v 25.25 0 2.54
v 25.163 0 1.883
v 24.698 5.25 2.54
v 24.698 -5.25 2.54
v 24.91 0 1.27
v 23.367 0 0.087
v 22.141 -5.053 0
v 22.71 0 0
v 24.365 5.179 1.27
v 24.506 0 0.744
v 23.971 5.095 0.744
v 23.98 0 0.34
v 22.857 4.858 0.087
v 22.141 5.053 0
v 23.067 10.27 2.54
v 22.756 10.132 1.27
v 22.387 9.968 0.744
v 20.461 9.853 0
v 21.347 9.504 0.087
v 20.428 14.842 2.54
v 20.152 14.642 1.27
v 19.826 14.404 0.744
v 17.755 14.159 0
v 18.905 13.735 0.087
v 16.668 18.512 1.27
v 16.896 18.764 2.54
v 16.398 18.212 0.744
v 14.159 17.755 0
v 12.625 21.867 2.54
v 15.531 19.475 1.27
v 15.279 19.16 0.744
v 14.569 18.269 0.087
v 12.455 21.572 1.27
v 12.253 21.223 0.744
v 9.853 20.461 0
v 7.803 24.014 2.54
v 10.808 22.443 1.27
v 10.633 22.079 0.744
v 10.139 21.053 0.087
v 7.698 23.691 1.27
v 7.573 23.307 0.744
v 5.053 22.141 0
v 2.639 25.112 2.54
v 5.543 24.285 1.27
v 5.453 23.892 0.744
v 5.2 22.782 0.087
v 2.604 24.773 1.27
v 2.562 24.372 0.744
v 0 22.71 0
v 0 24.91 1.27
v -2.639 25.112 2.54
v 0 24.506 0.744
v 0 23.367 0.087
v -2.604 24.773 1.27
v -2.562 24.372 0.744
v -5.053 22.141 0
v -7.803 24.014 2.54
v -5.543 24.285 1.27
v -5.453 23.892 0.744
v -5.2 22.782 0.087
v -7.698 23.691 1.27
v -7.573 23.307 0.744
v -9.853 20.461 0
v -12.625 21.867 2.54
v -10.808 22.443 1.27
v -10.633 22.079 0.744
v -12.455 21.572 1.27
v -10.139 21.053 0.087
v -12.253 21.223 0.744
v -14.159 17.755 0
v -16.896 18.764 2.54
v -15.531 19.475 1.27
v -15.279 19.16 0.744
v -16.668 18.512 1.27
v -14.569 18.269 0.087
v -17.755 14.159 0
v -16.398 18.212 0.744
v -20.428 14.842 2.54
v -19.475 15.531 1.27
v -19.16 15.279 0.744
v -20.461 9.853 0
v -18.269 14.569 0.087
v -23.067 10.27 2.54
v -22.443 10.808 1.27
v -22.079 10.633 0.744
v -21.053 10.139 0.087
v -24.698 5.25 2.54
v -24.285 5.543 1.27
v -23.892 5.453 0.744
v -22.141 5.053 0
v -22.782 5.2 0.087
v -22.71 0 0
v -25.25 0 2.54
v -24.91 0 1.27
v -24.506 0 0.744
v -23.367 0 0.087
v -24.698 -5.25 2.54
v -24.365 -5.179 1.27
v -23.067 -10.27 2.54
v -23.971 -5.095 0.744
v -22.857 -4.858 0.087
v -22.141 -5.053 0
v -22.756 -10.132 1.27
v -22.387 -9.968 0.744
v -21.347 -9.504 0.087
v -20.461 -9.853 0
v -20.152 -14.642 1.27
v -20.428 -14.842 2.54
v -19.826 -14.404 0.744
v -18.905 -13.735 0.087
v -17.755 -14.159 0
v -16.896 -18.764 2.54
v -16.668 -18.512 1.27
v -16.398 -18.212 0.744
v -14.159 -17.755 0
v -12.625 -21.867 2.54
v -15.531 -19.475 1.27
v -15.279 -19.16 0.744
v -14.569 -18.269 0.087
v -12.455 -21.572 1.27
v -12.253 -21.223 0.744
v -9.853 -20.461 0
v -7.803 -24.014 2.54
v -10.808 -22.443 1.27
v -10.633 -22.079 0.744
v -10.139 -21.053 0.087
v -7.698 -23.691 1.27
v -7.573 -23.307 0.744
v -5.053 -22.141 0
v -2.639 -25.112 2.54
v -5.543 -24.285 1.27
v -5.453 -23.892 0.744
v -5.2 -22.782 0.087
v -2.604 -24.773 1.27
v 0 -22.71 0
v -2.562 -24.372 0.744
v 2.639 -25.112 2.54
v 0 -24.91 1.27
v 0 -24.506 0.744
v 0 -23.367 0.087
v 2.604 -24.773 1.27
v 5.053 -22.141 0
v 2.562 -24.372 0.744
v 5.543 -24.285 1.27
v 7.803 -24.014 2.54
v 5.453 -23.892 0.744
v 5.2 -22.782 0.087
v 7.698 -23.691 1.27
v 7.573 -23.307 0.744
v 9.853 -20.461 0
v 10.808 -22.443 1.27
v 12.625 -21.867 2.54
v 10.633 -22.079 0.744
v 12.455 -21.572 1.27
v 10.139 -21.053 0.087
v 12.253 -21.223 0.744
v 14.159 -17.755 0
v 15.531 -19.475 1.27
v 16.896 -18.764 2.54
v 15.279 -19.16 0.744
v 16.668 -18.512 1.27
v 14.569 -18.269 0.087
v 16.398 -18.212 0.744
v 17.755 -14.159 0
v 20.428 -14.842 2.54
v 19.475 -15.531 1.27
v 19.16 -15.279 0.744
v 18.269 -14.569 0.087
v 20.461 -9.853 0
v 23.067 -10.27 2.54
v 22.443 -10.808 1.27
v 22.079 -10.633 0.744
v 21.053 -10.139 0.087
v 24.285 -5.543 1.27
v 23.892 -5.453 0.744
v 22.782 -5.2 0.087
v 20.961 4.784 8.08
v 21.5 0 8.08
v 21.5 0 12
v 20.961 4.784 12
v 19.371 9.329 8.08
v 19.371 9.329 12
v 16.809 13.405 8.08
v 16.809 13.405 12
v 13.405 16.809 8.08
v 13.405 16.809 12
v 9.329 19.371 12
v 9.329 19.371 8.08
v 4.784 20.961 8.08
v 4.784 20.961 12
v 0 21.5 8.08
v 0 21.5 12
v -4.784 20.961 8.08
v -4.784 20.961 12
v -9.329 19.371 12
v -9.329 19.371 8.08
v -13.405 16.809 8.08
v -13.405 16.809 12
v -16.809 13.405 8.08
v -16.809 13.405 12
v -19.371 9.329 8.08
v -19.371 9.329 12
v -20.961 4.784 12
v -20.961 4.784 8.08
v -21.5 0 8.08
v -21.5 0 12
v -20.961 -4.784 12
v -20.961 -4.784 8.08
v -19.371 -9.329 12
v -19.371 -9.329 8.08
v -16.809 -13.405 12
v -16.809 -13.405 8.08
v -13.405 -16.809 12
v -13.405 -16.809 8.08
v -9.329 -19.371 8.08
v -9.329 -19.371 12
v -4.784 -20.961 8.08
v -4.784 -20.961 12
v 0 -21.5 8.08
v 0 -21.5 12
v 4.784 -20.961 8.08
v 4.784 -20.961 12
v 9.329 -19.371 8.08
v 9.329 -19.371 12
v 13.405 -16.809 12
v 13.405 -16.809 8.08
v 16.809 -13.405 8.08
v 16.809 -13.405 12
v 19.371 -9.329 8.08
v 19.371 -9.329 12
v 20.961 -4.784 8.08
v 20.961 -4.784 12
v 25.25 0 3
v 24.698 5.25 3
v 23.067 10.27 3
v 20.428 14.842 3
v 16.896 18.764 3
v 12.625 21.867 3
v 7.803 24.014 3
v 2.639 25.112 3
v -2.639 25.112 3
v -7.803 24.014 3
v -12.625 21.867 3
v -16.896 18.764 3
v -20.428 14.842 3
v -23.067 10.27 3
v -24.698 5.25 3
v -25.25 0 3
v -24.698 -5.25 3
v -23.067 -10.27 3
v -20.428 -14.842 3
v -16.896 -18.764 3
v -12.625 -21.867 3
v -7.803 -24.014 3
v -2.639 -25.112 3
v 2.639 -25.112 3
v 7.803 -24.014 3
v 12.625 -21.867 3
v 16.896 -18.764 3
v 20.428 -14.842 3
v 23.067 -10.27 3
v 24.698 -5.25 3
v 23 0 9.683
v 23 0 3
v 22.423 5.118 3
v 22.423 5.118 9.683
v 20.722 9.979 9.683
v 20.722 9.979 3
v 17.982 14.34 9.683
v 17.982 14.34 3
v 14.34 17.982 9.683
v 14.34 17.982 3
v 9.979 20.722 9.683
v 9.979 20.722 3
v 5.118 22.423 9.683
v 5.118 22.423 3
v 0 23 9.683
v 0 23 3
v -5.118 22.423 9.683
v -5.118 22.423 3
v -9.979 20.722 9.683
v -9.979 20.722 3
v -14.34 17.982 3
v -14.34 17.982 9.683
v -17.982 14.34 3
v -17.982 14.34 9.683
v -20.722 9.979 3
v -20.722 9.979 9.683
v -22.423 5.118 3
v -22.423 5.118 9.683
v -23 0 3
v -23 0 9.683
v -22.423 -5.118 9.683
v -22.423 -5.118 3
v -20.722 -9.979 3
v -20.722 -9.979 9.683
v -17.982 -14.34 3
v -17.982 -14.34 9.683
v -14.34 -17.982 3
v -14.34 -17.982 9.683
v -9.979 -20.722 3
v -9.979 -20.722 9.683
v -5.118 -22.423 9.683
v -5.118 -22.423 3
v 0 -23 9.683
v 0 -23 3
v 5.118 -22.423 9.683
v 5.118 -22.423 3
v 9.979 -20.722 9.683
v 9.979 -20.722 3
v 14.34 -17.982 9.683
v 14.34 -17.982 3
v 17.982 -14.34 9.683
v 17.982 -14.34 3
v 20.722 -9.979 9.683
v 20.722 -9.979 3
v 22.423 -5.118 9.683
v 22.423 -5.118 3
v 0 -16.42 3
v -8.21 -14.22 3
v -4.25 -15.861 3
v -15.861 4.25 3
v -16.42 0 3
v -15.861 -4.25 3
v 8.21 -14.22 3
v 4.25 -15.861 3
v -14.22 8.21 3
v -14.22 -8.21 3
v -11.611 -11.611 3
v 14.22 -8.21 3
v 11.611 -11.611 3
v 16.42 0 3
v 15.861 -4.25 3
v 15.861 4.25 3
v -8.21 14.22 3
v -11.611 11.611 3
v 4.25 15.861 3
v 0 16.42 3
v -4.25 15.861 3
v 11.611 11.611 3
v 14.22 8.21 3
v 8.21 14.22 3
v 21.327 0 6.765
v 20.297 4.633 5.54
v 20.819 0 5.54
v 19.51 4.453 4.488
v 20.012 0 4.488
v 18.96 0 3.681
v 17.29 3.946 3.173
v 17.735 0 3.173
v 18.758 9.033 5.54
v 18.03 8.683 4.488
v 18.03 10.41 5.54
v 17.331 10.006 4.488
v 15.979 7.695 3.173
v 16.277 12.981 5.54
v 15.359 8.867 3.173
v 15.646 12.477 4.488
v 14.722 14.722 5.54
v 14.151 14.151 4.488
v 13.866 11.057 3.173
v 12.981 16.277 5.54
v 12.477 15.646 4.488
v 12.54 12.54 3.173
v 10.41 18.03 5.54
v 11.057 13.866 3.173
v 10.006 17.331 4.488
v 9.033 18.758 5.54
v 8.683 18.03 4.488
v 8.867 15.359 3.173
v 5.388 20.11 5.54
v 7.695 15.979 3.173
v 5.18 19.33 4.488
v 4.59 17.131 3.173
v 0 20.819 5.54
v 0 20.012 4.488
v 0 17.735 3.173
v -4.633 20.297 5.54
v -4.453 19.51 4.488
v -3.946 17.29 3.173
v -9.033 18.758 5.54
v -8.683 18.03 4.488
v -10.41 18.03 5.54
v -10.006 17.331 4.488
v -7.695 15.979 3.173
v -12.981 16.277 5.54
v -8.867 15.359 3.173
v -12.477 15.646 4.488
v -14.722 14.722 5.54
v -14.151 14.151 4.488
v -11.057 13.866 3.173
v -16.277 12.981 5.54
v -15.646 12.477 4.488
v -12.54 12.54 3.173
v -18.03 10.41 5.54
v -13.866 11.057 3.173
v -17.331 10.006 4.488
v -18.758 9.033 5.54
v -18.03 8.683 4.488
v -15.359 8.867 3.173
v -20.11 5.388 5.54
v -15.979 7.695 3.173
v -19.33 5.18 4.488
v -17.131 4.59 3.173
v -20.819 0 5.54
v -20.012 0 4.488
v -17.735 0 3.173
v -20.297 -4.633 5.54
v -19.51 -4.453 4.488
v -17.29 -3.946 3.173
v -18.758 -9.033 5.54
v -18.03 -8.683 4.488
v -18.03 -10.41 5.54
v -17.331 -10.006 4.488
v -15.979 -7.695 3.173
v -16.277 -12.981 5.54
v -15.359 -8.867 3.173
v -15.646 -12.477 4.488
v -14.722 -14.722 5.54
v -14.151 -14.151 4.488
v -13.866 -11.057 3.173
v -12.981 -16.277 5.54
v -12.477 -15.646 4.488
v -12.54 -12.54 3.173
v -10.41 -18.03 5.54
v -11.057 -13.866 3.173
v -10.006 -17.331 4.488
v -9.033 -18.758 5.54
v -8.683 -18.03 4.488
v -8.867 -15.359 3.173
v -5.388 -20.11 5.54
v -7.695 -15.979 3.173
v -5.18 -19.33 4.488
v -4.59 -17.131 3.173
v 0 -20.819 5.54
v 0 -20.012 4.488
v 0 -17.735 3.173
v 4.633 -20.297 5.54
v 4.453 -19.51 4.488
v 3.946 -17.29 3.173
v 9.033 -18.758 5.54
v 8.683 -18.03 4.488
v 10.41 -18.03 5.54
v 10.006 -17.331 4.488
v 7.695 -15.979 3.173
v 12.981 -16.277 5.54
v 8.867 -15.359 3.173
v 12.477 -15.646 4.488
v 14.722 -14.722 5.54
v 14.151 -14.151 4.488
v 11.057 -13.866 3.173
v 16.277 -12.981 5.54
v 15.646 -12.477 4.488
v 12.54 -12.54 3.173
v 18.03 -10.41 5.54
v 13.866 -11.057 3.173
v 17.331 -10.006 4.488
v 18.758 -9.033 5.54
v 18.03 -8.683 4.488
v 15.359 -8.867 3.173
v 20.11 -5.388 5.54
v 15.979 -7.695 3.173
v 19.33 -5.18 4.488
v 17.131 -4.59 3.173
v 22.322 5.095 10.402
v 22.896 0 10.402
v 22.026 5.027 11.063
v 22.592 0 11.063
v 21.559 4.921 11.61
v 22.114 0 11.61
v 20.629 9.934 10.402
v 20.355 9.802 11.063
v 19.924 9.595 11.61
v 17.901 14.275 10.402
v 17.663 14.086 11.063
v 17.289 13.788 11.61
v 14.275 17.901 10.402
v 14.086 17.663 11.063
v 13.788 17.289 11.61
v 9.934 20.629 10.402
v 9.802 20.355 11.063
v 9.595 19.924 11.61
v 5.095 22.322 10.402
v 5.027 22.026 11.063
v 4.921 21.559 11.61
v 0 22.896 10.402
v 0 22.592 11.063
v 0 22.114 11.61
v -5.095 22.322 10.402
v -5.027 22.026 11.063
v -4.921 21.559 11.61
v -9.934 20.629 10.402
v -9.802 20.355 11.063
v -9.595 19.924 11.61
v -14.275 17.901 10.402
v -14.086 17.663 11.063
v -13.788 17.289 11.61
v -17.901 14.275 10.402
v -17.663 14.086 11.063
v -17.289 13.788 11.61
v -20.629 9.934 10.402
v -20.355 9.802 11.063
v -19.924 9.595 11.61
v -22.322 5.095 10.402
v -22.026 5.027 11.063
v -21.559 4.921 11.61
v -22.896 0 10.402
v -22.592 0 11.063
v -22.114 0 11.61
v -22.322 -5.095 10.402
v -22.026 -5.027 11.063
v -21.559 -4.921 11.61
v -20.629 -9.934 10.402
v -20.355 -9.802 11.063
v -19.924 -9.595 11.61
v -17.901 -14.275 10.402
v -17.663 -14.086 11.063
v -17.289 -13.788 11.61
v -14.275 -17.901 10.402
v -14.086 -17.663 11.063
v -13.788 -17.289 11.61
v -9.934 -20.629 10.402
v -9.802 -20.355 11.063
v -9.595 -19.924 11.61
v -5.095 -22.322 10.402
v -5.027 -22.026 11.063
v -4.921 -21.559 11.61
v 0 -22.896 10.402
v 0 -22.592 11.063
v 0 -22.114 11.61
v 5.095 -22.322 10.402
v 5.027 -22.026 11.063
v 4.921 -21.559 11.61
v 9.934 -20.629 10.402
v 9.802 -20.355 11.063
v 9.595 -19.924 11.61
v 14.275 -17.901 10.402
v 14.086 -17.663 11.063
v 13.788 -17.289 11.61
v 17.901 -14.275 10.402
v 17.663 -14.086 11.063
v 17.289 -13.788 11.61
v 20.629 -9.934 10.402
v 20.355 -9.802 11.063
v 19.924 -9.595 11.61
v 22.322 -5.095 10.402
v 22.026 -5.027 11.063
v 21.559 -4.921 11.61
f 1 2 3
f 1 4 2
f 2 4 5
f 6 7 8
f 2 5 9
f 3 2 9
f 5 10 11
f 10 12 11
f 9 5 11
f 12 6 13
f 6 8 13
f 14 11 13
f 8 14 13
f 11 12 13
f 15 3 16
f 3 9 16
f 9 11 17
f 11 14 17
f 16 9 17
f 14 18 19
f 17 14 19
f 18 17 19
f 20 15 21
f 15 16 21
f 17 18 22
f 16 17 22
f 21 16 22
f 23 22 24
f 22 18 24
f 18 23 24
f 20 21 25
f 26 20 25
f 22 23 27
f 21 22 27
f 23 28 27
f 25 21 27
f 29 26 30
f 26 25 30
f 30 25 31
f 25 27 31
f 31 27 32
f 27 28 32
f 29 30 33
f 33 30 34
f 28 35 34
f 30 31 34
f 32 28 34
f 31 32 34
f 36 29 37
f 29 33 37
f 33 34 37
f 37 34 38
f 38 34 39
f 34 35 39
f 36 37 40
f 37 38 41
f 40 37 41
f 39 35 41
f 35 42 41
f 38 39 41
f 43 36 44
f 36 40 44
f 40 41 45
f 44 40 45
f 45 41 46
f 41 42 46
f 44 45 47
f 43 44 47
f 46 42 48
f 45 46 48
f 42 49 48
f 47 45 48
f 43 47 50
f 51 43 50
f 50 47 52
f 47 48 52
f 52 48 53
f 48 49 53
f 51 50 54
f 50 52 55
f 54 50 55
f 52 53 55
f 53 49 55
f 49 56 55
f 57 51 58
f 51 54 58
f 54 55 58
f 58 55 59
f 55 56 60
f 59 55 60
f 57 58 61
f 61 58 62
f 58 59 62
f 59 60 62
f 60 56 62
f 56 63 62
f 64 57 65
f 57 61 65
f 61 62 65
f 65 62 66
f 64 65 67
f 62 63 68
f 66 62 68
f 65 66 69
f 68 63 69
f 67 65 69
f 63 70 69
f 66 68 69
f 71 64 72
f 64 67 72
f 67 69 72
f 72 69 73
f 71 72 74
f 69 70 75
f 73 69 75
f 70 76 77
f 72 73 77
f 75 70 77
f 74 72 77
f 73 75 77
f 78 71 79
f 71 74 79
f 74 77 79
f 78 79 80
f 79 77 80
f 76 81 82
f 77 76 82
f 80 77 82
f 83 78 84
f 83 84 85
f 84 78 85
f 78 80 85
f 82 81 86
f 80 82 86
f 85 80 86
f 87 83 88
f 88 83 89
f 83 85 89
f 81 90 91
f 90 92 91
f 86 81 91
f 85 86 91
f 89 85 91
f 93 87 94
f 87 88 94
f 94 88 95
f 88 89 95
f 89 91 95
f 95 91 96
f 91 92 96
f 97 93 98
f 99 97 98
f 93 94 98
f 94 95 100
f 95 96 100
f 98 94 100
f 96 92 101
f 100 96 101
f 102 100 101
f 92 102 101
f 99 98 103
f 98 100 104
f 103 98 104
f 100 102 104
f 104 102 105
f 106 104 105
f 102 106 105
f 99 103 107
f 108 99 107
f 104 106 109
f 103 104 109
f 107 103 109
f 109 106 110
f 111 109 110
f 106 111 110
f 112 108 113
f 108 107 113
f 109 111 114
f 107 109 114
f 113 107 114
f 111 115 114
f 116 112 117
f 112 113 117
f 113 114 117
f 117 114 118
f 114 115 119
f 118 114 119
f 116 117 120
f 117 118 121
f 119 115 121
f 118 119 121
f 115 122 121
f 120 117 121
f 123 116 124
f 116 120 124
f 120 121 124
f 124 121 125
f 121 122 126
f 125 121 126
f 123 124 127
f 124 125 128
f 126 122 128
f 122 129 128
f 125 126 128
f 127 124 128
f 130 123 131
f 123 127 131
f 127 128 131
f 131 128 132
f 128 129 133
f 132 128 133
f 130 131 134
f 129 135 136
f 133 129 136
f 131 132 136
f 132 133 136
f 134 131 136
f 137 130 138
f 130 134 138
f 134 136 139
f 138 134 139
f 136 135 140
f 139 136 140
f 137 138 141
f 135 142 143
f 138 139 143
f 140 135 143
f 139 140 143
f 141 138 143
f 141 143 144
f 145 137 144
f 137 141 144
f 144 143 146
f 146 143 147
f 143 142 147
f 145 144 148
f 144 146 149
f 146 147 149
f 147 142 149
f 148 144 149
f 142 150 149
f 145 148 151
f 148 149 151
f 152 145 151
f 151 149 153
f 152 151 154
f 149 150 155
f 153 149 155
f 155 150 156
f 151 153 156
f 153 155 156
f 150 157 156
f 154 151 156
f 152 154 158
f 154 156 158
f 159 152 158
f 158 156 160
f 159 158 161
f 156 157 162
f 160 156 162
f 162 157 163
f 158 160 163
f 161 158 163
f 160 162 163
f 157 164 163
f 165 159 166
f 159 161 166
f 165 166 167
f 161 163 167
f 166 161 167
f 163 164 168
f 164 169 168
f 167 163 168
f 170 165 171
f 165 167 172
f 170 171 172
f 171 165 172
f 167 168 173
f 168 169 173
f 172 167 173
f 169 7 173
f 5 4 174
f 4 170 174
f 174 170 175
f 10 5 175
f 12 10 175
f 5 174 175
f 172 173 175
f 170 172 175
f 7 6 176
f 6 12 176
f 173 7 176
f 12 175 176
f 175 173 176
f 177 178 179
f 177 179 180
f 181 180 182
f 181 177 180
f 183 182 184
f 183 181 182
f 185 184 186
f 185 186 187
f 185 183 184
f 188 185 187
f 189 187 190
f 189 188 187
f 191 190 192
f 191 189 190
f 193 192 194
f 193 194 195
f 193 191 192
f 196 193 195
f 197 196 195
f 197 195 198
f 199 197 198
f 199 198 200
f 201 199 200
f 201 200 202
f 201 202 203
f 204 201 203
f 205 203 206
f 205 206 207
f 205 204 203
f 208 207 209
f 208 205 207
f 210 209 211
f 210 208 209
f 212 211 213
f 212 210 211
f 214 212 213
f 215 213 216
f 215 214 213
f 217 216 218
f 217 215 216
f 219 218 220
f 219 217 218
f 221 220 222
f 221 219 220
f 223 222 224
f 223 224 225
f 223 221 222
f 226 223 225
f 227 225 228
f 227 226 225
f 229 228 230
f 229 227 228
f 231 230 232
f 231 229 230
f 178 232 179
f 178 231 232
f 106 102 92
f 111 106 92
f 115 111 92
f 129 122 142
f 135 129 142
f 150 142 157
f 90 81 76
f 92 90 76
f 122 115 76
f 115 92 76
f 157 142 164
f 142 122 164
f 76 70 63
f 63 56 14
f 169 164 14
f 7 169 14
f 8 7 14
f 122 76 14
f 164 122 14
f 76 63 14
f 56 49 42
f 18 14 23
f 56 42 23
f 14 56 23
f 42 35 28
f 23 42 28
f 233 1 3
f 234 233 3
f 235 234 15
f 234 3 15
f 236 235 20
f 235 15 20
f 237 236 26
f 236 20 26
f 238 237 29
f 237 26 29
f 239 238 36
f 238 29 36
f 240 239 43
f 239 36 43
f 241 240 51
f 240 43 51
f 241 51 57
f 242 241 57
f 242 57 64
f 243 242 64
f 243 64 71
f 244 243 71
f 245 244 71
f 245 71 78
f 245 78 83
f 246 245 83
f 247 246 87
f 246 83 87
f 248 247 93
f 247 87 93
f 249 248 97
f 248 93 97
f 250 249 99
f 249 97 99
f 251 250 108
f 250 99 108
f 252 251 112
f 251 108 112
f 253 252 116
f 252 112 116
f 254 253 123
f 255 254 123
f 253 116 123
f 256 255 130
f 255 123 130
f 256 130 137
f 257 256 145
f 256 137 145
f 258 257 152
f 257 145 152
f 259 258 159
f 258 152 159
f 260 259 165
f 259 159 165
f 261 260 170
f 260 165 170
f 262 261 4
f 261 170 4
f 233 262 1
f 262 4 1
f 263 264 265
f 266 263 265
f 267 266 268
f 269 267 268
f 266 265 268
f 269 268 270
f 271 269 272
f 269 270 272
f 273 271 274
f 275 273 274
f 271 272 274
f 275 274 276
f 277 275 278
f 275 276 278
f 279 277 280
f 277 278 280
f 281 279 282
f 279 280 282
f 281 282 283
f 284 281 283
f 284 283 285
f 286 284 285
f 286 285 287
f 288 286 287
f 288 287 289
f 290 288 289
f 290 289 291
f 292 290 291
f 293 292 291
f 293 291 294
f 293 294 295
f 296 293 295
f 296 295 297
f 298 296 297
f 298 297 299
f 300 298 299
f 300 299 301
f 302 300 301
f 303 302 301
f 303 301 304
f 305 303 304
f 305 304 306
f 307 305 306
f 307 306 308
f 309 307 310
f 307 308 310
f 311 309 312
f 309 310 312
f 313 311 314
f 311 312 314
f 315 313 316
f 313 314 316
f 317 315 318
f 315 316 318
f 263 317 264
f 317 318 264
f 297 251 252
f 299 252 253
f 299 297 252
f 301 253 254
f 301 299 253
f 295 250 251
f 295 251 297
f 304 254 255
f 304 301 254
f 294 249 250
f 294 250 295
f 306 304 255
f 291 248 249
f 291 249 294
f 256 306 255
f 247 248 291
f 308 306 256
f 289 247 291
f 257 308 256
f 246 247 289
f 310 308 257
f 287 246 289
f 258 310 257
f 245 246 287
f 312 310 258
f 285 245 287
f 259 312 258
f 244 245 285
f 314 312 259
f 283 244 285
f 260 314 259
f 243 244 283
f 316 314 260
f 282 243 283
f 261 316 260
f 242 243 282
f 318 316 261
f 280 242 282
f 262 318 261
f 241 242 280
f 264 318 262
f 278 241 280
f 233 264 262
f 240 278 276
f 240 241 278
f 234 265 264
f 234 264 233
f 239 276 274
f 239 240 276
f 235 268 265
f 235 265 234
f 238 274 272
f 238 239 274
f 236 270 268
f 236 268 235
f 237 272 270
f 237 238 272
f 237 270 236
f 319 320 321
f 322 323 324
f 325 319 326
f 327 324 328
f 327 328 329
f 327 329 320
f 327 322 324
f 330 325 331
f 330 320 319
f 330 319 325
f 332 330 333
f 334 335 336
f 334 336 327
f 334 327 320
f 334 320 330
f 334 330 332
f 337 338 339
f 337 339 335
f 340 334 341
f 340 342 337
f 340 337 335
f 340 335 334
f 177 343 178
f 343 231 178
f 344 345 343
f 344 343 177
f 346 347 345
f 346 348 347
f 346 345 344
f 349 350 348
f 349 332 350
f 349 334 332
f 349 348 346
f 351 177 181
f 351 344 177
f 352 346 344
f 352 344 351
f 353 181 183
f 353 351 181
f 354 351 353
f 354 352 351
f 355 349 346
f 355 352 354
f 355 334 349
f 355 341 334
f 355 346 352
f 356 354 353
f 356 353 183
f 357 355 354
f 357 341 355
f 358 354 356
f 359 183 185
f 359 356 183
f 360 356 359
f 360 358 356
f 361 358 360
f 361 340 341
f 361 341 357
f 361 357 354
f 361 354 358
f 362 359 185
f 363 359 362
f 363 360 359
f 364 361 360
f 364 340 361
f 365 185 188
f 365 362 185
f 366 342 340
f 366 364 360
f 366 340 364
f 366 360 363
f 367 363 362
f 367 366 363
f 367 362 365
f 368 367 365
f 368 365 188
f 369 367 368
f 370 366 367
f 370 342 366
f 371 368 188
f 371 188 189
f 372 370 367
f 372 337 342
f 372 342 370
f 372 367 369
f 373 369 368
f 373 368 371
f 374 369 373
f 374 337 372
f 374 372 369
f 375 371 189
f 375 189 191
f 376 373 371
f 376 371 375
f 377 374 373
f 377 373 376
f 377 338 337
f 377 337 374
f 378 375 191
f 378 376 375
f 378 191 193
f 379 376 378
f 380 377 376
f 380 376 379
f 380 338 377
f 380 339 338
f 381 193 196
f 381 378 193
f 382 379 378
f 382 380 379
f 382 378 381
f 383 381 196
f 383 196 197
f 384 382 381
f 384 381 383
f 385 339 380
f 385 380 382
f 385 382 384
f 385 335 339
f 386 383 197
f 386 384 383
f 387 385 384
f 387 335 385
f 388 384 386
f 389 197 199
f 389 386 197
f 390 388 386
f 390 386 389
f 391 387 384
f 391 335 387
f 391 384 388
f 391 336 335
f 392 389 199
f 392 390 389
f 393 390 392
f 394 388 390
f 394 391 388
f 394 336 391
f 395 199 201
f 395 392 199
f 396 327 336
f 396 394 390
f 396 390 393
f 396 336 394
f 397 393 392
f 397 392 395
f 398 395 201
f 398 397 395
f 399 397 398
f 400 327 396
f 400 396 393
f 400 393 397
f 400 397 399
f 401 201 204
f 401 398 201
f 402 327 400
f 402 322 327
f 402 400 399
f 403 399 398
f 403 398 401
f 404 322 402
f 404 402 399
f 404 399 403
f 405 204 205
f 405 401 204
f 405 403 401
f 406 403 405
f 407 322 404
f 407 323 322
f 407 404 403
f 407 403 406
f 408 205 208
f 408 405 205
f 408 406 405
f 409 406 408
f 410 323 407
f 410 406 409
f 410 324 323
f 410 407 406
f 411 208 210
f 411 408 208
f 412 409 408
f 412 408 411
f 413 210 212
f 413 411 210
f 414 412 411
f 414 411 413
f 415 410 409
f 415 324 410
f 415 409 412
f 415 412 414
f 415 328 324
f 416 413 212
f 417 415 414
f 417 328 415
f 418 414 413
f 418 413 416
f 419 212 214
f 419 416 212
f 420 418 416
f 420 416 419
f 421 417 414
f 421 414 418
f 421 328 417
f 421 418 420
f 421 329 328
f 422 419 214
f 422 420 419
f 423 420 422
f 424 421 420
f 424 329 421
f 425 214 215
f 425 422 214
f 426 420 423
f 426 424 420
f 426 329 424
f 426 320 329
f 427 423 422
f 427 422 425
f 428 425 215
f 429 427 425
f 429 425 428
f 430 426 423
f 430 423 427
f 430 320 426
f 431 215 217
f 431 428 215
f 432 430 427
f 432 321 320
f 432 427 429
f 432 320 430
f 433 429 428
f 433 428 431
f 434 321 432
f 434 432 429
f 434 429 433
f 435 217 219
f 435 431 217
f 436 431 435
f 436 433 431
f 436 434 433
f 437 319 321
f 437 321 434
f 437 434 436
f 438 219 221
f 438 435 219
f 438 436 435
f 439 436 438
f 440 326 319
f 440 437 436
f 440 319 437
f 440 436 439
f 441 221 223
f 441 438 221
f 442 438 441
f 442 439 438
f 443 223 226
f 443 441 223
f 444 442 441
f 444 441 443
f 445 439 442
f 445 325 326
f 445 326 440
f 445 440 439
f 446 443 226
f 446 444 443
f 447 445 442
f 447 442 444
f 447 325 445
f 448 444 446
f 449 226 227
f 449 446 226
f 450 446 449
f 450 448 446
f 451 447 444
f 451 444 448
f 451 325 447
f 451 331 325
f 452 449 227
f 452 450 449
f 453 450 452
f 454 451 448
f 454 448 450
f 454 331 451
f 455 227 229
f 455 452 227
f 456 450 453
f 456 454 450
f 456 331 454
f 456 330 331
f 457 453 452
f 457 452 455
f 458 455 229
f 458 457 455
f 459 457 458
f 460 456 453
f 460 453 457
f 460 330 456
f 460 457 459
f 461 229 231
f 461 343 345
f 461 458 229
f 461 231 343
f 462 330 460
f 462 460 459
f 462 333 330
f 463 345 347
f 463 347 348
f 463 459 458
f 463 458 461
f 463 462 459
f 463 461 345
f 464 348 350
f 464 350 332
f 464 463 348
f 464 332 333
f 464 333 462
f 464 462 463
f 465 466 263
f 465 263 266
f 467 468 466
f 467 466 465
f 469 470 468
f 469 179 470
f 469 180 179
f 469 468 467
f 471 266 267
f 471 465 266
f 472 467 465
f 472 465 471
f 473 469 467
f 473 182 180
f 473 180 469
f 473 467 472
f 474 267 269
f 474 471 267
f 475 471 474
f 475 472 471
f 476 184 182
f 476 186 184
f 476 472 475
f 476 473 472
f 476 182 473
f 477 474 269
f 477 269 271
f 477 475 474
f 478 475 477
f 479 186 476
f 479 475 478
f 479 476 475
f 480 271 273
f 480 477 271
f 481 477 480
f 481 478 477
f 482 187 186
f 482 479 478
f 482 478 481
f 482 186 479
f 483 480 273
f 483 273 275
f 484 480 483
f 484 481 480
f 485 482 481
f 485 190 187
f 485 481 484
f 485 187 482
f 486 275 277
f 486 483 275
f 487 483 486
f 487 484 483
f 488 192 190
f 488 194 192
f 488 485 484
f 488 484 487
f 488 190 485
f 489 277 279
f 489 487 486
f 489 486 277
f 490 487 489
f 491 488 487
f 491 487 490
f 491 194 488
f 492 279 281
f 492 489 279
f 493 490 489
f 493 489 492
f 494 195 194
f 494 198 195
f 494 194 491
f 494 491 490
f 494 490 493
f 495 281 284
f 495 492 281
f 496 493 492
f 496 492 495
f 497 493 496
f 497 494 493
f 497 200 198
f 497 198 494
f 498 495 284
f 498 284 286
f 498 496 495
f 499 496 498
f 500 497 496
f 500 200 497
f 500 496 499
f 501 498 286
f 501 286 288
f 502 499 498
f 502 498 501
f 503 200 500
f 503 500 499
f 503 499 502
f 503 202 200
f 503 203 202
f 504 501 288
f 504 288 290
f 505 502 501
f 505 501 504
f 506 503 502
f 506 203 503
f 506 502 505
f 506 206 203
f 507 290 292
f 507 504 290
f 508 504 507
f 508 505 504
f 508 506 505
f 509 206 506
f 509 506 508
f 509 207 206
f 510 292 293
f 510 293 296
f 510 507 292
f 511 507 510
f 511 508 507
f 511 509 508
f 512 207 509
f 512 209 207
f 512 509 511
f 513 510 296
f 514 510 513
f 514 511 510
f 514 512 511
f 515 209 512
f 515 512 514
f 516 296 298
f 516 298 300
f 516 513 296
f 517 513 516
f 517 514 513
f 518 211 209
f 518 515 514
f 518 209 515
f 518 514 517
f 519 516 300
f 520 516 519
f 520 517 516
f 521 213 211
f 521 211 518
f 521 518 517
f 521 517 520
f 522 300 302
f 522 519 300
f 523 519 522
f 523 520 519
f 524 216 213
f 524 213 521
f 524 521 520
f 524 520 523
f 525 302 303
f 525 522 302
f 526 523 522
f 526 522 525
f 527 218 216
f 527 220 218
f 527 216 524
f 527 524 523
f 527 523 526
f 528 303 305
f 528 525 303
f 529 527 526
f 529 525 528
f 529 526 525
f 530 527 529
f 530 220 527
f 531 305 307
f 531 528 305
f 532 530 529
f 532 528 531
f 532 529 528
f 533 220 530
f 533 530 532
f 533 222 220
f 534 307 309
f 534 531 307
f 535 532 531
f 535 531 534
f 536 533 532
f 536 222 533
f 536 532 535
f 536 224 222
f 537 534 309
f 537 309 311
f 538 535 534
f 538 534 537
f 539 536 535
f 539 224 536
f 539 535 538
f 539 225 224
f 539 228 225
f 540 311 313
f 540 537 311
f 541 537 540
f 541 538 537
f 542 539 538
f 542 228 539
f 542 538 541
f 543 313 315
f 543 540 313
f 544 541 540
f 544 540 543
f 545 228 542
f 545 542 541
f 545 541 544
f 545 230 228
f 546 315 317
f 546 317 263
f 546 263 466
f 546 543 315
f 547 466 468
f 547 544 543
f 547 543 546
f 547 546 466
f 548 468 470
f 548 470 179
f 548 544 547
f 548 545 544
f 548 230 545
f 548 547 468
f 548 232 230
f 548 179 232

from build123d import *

# Parameters (mm, degrees)
F0_R     = 25.25
F1_DEPTH = 3
F2_R     = 23
F2_R_2   = 21.5
F3_DEPTH = 9
F4_R     = 2.54
F6_R     = 5.08


# Not quite as in the source:
# - a fillet or chamfer that OpenCascade refuses, or shapes differently, is made with other operations: its cross-section is extruded or revolved along the edge and cut away or added


with BuildPart() as f1:
    # F0 (on Top) → F1 (new body)
    with BuildSketch(Plane.XY):
        Circle(F0_R)
    extrude(amount=F1_DEPTH)

    # F2 (on face) → F3 (join)
    with BuildSketch(Plane.XY.offset(3)):
        Circle(F2_R)
        Circle(F2_R_2, mode=Mode.SUBTRACT)
    extrude(amount=F3_DEPTH)

    # F4
    f4_edges = [f1.edges().sort_by_distance(p)[0] for p in [
        (-25.25, 0, 0),
    ]]
    fillet(f4_edges, radius=F4_R)

    # F5: fillet of radius 2.54 on 1 edges, made by hand

    # F5_s1 → F5_t2 (revolve, cut)
    with BuildSketch(Plane.XZ):
        with BuildLine():
            ThreePointArc((23, 9.6826739547), (22.5922757795, 11.0628913289), (21.5, 12))
            Line((21.5, 12), (23, 12))
            Line((23, 12), (23, 9.6826739547))
        make_face()
    revolve(axis=Axis((0, 0, 12), (0, 0, 1)), mode=Mode.SUBTRACT)

    # F6
    f6_edges = [f1.edges().sort_by_distance(p)[0] for p in [
        (-21.5, 0, 3),
    ]]
    fillet(f6_edges, radius=F6_R)


solid = f1.part
